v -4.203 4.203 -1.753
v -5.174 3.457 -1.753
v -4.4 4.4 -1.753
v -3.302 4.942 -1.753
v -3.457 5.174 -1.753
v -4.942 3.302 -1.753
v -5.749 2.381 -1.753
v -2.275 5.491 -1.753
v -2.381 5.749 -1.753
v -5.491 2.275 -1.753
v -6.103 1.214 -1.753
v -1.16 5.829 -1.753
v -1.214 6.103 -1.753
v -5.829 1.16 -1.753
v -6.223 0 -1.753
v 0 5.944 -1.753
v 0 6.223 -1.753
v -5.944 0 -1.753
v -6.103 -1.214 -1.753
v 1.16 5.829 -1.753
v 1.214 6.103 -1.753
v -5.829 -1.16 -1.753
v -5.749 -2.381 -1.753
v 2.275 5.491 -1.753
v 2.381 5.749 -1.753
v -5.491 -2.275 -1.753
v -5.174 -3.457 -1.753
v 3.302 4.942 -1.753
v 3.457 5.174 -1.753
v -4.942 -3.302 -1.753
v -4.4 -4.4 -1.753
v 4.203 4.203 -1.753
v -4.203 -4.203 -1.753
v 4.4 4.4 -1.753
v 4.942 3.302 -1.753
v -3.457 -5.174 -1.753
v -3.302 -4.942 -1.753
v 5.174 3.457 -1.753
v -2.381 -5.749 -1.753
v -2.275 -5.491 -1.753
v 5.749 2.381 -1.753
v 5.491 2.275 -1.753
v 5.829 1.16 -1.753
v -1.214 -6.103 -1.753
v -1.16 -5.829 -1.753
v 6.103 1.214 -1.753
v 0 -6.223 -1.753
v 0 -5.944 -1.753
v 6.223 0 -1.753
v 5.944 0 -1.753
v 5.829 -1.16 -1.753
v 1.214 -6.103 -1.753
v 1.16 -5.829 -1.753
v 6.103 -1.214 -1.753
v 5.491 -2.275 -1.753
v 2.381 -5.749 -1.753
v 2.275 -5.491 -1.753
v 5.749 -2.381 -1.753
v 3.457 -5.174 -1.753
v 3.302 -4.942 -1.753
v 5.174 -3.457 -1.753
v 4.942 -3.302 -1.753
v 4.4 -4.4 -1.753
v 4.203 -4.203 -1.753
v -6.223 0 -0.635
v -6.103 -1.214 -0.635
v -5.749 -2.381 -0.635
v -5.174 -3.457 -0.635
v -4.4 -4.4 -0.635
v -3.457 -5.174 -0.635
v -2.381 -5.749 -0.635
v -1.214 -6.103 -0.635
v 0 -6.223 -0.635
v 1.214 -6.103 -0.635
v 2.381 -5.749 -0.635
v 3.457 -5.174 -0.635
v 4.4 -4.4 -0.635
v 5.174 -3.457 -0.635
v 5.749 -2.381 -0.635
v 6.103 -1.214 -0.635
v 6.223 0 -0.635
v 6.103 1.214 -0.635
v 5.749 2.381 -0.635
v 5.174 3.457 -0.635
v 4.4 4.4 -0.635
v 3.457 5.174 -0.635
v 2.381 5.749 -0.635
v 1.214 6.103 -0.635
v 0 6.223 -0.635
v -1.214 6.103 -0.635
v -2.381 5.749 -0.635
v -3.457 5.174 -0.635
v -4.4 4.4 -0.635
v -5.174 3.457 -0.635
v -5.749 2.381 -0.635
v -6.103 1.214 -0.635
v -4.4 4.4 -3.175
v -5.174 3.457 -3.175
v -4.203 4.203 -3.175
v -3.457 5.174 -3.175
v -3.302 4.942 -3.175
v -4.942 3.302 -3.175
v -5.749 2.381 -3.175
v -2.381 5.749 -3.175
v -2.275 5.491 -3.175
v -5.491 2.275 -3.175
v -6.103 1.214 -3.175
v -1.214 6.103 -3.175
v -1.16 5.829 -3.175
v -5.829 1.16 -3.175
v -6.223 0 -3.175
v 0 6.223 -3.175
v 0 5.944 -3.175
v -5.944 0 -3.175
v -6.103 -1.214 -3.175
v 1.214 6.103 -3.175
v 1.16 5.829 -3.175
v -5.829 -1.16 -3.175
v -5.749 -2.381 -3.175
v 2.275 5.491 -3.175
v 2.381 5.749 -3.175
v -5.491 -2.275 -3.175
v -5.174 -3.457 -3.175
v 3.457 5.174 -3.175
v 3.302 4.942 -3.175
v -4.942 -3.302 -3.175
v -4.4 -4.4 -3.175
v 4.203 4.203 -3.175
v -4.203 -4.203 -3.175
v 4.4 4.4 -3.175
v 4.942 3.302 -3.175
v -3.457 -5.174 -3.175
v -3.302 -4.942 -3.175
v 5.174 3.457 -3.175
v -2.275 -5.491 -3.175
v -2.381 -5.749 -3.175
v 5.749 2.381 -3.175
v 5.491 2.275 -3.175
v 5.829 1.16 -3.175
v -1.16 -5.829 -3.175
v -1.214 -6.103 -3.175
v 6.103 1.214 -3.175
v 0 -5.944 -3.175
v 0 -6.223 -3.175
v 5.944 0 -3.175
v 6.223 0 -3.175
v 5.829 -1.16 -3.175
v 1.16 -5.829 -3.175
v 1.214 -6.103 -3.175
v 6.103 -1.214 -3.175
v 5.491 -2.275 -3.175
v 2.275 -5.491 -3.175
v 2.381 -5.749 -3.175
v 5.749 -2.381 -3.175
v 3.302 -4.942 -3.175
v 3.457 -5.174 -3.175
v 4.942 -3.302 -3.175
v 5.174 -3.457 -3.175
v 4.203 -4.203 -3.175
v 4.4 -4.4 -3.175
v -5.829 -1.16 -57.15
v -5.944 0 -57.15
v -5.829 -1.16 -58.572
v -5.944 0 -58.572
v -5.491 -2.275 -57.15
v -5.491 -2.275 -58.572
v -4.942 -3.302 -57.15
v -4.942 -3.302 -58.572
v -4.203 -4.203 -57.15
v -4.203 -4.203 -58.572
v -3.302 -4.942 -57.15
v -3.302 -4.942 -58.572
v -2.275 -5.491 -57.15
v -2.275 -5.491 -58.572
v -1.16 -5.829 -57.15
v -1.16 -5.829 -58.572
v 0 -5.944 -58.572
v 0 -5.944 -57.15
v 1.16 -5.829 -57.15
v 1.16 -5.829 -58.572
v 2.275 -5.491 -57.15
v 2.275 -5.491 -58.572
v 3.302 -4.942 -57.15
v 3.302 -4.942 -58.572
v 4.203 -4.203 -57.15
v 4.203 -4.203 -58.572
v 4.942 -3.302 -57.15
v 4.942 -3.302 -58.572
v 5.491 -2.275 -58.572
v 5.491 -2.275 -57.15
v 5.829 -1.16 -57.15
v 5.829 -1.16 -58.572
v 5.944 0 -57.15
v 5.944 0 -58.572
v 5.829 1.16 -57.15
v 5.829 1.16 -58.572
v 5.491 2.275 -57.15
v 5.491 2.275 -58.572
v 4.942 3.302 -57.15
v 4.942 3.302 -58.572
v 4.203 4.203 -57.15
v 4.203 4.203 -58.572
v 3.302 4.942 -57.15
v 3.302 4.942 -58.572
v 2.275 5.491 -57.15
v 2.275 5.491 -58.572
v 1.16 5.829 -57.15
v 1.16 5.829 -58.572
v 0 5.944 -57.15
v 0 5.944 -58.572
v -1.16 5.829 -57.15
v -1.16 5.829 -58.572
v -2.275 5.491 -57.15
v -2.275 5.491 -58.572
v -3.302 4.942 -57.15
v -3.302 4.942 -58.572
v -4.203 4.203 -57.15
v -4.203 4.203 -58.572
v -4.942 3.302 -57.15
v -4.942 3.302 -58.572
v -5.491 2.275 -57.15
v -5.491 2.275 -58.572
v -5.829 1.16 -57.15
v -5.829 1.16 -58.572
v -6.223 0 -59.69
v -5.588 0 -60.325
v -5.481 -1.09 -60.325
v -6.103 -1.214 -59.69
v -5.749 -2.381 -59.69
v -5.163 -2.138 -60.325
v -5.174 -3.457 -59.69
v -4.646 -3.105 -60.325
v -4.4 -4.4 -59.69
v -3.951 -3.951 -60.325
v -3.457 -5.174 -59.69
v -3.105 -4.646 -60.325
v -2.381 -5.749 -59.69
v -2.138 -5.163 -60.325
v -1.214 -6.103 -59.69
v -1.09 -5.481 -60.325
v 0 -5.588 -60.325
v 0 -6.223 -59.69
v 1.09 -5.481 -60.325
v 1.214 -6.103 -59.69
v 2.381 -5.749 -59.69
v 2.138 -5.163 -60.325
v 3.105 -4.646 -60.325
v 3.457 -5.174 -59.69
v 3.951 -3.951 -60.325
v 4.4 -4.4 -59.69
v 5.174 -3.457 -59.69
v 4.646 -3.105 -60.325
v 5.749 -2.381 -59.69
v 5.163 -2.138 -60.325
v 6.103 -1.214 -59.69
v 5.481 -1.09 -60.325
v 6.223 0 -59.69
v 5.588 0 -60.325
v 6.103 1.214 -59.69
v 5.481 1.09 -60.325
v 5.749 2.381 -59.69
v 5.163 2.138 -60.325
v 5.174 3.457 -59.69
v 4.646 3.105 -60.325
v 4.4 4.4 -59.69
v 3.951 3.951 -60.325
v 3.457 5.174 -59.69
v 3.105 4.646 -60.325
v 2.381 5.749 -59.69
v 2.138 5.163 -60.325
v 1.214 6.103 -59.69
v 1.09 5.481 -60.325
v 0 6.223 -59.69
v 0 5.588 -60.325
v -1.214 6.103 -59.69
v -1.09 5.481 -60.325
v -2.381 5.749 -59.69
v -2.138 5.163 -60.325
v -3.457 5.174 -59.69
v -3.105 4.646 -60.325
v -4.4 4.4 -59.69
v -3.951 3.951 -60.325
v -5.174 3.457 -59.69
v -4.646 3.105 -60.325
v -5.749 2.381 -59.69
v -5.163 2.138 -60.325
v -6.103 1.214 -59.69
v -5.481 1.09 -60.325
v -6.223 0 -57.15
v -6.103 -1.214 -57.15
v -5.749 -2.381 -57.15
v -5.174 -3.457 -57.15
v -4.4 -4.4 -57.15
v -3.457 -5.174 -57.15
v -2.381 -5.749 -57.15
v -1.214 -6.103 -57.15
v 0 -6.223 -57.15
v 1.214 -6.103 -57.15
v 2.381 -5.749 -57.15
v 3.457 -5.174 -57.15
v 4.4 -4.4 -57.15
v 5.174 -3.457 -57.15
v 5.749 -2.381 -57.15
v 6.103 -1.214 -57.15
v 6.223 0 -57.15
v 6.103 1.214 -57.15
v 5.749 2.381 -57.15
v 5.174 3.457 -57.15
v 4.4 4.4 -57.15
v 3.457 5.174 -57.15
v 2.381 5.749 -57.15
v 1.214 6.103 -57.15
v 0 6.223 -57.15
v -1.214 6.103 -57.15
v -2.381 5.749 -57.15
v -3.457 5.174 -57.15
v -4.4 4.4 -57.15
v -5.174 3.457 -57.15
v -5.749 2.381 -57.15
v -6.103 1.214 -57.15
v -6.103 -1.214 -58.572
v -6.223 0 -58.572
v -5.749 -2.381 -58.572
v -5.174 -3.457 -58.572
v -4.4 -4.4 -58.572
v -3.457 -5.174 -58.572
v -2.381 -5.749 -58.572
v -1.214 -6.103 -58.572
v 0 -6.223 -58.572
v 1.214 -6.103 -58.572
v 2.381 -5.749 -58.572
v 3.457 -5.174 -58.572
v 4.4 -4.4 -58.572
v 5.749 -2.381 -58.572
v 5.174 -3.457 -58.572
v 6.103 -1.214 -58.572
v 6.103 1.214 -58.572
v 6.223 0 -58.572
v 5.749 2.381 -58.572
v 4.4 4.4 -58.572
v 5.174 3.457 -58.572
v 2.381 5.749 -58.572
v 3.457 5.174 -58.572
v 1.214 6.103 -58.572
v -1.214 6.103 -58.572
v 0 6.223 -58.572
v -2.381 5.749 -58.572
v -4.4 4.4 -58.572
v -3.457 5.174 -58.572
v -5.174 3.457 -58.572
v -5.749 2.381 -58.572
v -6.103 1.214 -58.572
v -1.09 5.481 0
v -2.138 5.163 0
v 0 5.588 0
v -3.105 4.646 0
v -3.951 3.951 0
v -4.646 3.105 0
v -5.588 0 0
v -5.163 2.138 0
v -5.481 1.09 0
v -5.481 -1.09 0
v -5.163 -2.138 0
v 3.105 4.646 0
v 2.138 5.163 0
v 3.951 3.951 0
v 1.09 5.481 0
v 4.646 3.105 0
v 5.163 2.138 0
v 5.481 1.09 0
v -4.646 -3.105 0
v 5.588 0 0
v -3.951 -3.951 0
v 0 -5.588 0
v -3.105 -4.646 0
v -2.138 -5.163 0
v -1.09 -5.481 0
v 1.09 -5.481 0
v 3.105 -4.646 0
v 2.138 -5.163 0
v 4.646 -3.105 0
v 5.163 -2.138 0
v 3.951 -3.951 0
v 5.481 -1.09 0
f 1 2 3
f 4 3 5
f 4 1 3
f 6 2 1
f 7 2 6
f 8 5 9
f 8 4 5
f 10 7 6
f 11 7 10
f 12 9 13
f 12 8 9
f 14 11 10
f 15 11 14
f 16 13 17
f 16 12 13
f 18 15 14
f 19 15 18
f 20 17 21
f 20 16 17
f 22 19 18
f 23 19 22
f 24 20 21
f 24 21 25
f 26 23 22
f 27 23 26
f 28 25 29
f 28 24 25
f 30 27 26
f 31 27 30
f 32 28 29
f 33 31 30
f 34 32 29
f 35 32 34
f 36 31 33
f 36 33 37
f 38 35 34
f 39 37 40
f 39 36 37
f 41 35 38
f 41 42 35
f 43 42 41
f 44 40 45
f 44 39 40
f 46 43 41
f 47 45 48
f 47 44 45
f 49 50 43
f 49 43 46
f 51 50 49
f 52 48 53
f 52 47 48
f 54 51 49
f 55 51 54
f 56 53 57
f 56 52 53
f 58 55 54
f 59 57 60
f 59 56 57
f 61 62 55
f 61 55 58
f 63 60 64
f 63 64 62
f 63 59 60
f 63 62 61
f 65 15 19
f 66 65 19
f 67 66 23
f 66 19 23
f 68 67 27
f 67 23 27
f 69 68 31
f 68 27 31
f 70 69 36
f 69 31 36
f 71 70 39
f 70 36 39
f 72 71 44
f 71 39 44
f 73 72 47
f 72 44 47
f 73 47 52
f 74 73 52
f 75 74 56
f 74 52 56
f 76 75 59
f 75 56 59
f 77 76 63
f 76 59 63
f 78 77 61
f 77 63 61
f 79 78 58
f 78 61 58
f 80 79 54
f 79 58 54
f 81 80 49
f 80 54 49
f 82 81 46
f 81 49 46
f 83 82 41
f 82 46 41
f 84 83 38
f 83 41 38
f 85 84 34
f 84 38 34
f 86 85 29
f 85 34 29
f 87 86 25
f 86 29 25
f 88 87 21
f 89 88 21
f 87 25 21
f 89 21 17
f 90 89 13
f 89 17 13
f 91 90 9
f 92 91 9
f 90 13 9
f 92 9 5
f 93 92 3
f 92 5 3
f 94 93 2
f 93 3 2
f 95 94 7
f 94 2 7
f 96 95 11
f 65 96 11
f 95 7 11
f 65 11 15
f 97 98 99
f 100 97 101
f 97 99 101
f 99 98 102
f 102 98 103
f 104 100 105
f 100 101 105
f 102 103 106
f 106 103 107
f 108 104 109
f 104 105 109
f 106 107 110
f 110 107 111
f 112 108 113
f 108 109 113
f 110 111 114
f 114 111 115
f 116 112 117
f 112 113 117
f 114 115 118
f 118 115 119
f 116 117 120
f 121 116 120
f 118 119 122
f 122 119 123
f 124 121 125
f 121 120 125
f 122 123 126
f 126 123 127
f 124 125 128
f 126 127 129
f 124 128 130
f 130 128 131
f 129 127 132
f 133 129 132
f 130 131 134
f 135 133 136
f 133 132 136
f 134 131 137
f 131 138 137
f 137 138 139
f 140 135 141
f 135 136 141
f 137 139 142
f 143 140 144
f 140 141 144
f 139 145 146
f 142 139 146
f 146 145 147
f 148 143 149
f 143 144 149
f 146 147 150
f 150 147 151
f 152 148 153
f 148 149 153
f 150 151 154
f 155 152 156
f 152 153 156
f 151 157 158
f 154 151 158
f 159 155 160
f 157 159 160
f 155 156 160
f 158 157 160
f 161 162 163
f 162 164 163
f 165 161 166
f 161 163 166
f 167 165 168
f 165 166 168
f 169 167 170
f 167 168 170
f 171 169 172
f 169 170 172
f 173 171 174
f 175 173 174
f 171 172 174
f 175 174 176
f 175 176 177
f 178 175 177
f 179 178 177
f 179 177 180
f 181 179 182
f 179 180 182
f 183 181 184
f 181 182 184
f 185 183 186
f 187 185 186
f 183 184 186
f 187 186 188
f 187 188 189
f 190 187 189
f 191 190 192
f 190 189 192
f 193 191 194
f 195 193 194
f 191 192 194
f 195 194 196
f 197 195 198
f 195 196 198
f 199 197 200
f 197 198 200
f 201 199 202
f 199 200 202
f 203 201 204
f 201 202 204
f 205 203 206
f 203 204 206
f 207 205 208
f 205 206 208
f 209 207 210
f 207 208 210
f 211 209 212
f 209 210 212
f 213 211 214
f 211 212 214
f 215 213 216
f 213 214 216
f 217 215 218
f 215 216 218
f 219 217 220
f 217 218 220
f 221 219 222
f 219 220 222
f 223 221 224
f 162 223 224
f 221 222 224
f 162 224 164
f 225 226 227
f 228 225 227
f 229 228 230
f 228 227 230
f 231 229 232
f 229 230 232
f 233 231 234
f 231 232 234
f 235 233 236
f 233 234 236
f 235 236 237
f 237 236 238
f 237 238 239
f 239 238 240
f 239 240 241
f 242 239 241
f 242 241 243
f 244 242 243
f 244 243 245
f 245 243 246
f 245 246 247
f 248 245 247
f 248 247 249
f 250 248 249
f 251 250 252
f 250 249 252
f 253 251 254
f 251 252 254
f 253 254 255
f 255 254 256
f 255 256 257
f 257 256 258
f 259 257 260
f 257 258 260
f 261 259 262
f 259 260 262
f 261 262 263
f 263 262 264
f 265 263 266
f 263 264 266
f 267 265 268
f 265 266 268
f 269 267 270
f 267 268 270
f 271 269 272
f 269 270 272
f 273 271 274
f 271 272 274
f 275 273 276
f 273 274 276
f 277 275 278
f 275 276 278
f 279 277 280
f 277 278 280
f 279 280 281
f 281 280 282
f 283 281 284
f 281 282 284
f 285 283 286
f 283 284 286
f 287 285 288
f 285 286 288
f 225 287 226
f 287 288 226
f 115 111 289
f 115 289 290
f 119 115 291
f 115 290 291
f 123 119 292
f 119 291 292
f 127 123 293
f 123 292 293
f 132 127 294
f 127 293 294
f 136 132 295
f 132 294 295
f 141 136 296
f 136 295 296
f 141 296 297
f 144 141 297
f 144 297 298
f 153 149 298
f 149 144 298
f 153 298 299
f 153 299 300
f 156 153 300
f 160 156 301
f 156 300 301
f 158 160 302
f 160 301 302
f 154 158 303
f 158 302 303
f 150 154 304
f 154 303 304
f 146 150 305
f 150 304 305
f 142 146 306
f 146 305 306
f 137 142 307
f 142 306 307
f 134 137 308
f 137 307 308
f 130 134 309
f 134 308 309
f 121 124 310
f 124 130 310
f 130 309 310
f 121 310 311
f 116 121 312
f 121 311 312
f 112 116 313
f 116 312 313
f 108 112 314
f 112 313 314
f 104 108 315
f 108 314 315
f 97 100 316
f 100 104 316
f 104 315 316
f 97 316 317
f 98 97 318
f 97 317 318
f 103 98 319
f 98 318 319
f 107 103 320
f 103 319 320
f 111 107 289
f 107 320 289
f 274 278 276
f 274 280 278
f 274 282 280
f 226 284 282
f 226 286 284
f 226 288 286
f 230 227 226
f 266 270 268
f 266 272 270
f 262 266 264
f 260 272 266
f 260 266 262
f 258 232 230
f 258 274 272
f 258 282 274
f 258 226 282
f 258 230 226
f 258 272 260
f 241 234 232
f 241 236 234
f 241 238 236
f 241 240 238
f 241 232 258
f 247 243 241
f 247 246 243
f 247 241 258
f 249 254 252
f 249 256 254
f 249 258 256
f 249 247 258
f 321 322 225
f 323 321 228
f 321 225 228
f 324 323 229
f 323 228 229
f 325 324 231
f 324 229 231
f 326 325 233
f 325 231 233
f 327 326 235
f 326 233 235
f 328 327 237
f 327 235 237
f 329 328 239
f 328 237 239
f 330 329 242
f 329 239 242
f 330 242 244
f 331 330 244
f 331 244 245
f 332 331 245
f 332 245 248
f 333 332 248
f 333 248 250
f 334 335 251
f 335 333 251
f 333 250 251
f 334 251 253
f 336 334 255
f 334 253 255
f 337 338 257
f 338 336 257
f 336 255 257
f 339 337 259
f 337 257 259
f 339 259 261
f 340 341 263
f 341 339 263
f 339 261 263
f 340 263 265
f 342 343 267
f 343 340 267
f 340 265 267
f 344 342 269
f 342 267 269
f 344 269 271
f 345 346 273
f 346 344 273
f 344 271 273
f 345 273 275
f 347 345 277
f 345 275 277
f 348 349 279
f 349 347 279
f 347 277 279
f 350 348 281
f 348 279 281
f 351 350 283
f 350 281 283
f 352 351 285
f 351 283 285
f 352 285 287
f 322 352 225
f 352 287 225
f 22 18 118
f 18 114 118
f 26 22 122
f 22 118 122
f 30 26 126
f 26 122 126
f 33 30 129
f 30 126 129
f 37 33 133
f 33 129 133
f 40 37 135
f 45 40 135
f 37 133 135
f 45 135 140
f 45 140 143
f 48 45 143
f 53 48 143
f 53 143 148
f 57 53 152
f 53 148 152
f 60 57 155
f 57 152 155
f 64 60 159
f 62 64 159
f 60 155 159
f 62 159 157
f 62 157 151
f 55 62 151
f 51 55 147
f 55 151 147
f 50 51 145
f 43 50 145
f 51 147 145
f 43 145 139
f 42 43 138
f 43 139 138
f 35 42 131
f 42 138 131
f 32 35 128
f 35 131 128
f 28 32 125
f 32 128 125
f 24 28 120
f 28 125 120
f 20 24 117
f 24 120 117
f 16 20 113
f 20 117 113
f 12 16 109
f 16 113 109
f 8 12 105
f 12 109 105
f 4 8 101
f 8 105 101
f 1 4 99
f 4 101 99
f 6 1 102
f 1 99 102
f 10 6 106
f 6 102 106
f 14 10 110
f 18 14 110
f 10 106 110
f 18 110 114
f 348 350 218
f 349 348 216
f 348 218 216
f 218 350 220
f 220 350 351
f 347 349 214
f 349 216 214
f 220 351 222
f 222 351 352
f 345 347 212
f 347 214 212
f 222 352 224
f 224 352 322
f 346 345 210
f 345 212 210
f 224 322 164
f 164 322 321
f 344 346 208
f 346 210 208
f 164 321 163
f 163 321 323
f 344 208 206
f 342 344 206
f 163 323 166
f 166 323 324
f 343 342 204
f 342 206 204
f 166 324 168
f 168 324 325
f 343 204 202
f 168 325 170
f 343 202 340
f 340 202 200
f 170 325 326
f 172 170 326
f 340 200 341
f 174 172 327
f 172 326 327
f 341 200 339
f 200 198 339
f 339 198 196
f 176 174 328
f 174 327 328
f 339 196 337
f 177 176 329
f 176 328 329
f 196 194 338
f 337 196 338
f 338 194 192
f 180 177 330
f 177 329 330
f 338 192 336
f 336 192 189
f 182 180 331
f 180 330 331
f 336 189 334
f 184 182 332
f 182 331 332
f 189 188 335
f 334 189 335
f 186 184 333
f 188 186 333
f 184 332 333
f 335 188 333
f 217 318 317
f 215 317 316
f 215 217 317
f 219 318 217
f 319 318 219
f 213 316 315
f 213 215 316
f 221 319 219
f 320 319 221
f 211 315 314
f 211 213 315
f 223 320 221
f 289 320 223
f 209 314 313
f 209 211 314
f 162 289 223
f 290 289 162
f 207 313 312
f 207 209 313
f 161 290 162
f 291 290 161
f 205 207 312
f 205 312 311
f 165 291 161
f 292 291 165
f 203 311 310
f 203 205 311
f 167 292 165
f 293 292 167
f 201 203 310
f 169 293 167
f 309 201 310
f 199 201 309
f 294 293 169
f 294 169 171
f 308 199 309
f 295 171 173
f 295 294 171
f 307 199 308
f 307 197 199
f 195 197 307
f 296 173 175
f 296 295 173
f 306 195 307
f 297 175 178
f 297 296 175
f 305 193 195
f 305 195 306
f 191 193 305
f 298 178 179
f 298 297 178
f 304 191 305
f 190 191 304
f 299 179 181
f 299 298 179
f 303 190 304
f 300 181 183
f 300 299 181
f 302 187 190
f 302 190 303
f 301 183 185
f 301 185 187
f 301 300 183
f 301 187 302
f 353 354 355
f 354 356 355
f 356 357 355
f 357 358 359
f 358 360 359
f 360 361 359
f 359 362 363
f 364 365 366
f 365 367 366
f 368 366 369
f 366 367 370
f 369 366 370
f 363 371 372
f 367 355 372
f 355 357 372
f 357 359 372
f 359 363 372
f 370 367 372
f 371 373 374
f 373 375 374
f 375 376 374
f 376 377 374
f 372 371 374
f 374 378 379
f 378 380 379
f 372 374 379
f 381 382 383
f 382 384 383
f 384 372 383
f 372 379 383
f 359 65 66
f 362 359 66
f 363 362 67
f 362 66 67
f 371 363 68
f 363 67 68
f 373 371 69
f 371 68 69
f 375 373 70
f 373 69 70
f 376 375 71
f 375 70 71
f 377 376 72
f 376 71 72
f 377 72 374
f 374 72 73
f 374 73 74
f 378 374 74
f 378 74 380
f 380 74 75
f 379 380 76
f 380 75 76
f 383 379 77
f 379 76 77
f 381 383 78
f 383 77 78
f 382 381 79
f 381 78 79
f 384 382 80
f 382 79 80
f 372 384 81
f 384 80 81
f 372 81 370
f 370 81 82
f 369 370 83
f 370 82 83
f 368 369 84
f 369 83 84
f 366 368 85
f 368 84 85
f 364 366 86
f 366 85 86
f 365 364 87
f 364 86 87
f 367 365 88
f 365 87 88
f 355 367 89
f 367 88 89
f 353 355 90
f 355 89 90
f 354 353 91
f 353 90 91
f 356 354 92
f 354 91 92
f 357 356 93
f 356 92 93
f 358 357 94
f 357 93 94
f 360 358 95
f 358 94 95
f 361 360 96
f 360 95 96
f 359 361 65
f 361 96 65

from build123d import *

# Parameters (mm, degrees)
SKETCH1_W     = 60.325
SKETCH1_H     = 6.223
SKETCH2_W     = 1.4224
SKETCH2_H     = 0.8128
CHAMFER1_SIZE = 0.635


with BuildPart() as part:
    # Sketch1 → Revolve1 (revolve)
    with BuildSketch(Plane(origin=(0, 0, 0), x_dir=(0, 0, -1), z_dir=(1, 0, 0))):
        with Locations((30.1625, 3.1115)):
            Rectangle(SKETCH1_W, SKETCH1_H)
    revolve(axis=Axis((0, 0, 0), (0, 0, 1)))

    # Sketch2 → Cut-Revolve1 (revolve, cut)
    with BuildSketch(Plane(origin=(0, 0, 0), x_dir=(0, 0, -1), z_dir=(1, 0, 0))):
        with Locations((2.4638, 6.35)):
            Rectangle(SKETCH2_W, SKETCH2_H)
        with Locations((57.8612, 6.35)):
            Rectangle(SKETCH2_W, SKETCH2_H)
    revolve(axis=Axis((0, 0, 0), (0, 0, 1)), mode=Mode.SUBTRACT)

    # Chamfer1
    chamfer1_edges = [part.edges().sort_by_distance(p)[0] for p in [
        (0, -6.223, -60.325),
        (0, -6.223, 0),
    ]]
    chamfer(chamfer1_edges, length=CHAMFER1_SIZE)


solid = part.part
